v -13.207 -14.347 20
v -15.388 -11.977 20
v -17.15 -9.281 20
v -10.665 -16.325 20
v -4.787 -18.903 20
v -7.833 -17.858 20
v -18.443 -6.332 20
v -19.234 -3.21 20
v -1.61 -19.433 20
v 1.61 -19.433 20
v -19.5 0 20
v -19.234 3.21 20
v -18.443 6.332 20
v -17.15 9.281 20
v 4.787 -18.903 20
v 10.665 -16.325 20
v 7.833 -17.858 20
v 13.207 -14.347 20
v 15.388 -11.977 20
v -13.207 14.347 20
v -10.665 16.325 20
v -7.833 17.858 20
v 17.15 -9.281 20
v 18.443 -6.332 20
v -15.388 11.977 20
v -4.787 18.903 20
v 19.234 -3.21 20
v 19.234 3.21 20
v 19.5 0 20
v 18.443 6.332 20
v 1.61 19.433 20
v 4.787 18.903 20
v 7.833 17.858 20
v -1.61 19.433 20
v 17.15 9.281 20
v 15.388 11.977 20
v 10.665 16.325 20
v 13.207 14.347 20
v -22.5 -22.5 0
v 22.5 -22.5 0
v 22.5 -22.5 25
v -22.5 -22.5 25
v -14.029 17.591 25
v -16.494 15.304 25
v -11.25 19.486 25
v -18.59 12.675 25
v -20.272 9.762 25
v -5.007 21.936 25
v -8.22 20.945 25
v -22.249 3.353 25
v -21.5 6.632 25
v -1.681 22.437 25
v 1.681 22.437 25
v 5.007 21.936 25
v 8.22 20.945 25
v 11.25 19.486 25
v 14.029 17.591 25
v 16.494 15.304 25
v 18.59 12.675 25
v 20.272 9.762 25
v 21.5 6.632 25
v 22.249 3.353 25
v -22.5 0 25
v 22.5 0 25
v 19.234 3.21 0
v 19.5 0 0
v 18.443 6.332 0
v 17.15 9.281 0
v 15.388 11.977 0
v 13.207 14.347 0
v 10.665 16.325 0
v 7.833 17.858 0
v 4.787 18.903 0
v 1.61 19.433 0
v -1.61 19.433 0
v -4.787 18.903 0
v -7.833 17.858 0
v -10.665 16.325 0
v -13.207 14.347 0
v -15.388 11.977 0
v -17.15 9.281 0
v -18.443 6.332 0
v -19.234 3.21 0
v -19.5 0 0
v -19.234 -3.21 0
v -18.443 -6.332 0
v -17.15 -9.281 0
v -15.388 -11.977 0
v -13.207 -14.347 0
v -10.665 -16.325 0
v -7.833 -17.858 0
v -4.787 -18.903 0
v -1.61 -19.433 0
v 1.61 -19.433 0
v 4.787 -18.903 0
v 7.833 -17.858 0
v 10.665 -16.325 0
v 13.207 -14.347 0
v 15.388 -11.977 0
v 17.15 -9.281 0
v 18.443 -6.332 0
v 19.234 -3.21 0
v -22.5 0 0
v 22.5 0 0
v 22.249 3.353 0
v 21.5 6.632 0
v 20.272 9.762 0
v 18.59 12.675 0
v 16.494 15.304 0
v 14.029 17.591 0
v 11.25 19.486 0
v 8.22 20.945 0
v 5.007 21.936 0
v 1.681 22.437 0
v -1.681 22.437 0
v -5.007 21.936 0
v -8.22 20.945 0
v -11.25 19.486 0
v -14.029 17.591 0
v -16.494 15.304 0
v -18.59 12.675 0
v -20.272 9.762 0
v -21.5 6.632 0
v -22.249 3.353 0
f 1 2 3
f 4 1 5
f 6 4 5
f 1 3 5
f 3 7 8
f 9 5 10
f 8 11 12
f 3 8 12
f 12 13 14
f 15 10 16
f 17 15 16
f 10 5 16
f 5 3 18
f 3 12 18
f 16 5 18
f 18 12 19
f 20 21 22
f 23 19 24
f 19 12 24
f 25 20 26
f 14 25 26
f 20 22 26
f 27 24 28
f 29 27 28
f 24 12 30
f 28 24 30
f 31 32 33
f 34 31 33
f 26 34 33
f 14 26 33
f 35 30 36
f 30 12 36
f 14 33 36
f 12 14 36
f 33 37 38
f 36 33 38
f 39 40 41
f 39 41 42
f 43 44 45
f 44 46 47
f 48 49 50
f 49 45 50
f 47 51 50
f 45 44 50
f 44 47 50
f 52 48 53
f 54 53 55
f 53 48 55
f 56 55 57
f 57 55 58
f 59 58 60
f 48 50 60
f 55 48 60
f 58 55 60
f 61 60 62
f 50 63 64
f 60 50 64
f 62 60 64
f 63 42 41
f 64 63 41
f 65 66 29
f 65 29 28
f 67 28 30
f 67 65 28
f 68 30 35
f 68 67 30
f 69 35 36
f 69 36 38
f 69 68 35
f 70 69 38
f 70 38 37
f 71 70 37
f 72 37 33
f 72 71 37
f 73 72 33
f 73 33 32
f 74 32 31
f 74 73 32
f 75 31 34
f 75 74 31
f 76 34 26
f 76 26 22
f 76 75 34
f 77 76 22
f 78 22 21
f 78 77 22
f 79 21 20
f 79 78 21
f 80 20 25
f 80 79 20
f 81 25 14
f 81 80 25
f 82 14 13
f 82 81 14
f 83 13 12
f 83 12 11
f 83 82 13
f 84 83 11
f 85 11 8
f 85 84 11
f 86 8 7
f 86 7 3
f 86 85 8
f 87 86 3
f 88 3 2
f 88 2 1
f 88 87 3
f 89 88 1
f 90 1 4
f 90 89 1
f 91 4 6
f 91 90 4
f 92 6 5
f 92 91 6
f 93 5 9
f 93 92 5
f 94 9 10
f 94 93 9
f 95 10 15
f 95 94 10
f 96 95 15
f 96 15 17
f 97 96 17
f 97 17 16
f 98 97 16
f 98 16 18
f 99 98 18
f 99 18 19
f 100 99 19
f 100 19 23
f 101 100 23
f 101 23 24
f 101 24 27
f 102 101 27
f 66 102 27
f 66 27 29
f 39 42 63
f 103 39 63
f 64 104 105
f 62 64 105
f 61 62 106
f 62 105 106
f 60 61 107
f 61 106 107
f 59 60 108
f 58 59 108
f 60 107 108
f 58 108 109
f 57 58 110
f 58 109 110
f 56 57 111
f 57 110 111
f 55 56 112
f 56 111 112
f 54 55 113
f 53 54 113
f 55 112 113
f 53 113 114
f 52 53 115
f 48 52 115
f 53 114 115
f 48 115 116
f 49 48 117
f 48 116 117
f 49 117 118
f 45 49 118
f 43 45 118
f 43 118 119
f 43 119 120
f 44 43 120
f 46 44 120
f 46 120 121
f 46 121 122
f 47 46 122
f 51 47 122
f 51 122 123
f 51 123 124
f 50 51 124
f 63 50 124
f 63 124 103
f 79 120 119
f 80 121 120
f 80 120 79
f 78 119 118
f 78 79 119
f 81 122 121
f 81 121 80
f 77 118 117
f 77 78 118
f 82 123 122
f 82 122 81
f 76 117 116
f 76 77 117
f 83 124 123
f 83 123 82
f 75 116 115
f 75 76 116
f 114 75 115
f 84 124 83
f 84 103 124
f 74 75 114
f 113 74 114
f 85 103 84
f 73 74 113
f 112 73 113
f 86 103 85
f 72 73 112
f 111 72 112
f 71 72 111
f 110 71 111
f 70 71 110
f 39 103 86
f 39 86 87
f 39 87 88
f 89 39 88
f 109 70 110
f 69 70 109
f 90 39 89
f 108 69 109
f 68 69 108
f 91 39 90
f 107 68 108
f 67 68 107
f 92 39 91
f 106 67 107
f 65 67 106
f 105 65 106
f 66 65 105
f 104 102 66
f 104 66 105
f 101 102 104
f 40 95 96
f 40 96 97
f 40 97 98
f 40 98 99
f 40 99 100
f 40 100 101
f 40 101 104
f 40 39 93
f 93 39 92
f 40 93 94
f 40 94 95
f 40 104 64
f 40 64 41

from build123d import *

# Parameters (mm, degrees)
F0_R     = 22.5
F1_DEPTH = 25
F2_R     = 19.5
F3_DEPTH = 20
F5_DEPTH = 25


with BuildPart() as f1:
    # F0 (on Top) → F1 (new body)
    with BuildSketch(Plane.XY):
        Circle(F0_R)
    extrude(amount=F1_DEPTH)

    # F2 (on Top) → F3 (cut)
    with BuildSketch(Plane.XY):
        Circle(F2_R)
    extrude(amount=F3_DEPTH, mode=Mode.SUBTRACT)

    # F4 (on face) → F5 (join)
    with BuildSketch(Plane(origin=(0, 0, 0), x_dir=(1, 0, 0), z_dir=(0, 0, -1))):
        with BuildLine():
            Line((-22.5, 22.5), (-22.5, 2.46e-08))
            ThreePointArc((-22.5, 2.46e-08), (-15.9099025593, 15.9099025941), (2.47e-08, 22.5))
            Line((2.47e-08, 22.5), (-22.5, 22.5))
        make_face()
        with BuildLine():
            ThreePointArc((2.47e-08, 22.5), (15.9099025854, 15.909902568), (22.5, 0))
            Line((22.5, 0), (22.5, 22.5))
            Line((22.5, 22.5), (2.47e-08, 22.5))
        make_face()
    extrude(amount=-F5_DEPTH)


solid = f1.part
